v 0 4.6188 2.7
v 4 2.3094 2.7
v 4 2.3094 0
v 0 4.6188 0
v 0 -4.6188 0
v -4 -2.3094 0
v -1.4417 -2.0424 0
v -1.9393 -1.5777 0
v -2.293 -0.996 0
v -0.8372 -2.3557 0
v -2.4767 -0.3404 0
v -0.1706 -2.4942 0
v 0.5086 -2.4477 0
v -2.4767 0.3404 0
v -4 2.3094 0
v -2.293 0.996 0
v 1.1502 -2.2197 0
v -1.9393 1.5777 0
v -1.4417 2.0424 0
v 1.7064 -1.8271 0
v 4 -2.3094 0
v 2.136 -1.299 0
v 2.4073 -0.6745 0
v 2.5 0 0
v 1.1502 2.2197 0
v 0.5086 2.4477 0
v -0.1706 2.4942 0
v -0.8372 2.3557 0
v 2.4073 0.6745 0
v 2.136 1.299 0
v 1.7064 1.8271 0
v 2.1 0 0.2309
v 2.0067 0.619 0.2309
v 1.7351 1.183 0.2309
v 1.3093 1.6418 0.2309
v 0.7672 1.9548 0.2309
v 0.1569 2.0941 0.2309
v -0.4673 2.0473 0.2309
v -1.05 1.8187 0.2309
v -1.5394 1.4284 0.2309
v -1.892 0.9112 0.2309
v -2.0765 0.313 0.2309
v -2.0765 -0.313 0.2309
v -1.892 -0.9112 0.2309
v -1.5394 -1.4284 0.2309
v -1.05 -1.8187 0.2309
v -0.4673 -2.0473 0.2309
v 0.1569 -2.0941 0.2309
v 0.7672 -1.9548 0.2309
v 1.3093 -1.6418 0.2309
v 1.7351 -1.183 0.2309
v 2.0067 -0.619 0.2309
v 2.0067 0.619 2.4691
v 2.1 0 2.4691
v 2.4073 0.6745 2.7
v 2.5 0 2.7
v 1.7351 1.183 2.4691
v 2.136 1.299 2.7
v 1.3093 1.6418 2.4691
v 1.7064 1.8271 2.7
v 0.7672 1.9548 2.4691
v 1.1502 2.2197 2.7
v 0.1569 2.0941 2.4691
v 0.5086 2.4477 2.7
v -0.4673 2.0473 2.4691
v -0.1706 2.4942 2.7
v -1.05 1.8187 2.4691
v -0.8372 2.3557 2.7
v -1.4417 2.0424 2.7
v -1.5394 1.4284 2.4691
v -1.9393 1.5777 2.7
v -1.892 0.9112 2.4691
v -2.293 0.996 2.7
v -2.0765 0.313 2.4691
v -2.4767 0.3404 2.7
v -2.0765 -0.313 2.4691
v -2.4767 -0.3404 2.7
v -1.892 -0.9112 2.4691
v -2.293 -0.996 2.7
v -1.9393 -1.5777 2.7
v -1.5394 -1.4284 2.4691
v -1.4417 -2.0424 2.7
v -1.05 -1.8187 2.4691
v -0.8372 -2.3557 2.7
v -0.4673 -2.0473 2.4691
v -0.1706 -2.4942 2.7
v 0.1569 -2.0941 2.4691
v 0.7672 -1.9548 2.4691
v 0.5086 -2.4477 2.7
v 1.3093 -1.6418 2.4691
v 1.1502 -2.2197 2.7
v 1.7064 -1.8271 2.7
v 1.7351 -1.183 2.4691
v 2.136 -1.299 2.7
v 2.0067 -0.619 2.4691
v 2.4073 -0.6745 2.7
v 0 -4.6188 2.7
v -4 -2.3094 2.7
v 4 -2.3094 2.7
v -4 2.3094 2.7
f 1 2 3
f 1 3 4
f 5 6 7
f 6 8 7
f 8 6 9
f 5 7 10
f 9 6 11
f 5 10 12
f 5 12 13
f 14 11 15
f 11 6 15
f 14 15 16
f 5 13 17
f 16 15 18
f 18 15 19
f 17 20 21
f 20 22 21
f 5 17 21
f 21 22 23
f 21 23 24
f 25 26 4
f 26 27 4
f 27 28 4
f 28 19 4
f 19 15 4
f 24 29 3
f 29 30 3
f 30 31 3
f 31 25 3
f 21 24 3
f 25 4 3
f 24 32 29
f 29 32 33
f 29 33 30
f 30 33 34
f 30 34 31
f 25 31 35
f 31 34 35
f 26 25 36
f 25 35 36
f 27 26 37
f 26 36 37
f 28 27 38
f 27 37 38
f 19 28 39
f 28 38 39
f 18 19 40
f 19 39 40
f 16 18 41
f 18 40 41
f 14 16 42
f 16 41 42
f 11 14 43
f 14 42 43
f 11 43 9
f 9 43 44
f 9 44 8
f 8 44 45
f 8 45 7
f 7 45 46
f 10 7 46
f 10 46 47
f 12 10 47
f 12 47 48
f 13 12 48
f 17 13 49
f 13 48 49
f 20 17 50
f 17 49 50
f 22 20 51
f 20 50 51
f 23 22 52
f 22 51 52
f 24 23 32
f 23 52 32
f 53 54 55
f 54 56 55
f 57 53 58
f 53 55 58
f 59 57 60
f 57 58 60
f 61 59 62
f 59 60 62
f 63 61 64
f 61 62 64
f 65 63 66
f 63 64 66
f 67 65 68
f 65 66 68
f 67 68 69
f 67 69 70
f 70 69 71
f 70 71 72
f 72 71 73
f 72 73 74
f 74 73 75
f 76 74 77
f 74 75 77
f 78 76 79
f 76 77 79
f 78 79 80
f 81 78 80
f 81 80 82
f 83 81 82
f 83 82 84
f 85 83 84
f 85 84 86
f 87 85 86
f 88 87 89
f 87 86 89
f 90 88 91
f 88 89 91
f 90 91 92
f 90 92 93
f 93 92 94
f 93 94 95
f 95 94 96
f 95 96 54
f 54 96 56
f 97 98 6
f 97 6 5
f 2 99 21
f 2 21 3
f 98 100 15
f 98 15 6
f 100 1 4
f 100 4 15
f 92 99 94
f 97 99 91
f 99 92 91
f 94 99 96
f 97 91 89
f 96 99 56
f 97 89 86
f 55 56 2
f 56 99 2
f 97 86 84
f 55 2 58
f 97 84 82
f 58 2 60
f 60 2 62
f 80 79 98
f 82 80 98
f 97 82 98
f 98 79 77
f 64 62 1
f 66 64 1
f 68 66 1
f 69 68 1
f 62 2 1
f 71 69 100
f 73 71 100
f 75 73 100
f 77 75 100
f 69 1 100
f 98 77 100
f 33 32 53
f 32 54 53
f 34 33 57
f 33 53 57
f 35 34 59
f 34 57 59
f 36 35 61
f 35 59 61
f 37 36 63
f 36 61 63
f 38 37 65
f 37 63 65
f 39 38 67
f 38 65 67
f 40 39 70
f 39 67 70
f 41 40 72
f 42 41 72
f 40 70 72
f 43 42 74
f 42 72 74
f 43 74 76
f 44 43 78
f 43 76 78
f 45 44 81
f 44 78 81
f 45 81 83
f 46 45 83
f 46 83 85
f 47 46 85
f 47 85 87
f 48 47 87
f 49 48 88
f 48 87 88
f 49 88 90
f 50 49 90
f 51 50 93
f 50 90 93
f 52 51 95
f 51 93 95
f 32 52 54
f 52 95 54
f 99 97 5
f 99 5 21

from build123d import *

# Parameters (mm, degrees)
SKETCH001_R  = 5
POCKET_DEPTH = 2.7


with BuildPart() as part:
    # Sketch → Revolution (revolve)
    with BuildSketch(Plane.XZ):
        Polygon((2.5, 0), (2.1, 0.23094), (2.1, 2.46906), (2.5, 2.7), (5, 2.7), (5, 0), align=None)
    revolve(axis=Axis((0, 0, 0), (0, 0, 1)))

    # Sketch001 → Pocket (cut)
    with BuildSketch(Plane(origin=(0, 0, 2.7), x_dir=(-1, 0, 0), z_dir=(0, 0, 1))):
        Circle(SKETCH001_R)
        Polygon((-4, 2.309401), (-4, -2.309401), (0, -4.618802), (4, -2.309401), (4, 2.309401), (0, 4.618802), align=None, mode=Mode.SUBTRACT)
    extrude(amount=-POCKET_DEPTH, mode=Mode.SUBTRACT)


solid = part.part
